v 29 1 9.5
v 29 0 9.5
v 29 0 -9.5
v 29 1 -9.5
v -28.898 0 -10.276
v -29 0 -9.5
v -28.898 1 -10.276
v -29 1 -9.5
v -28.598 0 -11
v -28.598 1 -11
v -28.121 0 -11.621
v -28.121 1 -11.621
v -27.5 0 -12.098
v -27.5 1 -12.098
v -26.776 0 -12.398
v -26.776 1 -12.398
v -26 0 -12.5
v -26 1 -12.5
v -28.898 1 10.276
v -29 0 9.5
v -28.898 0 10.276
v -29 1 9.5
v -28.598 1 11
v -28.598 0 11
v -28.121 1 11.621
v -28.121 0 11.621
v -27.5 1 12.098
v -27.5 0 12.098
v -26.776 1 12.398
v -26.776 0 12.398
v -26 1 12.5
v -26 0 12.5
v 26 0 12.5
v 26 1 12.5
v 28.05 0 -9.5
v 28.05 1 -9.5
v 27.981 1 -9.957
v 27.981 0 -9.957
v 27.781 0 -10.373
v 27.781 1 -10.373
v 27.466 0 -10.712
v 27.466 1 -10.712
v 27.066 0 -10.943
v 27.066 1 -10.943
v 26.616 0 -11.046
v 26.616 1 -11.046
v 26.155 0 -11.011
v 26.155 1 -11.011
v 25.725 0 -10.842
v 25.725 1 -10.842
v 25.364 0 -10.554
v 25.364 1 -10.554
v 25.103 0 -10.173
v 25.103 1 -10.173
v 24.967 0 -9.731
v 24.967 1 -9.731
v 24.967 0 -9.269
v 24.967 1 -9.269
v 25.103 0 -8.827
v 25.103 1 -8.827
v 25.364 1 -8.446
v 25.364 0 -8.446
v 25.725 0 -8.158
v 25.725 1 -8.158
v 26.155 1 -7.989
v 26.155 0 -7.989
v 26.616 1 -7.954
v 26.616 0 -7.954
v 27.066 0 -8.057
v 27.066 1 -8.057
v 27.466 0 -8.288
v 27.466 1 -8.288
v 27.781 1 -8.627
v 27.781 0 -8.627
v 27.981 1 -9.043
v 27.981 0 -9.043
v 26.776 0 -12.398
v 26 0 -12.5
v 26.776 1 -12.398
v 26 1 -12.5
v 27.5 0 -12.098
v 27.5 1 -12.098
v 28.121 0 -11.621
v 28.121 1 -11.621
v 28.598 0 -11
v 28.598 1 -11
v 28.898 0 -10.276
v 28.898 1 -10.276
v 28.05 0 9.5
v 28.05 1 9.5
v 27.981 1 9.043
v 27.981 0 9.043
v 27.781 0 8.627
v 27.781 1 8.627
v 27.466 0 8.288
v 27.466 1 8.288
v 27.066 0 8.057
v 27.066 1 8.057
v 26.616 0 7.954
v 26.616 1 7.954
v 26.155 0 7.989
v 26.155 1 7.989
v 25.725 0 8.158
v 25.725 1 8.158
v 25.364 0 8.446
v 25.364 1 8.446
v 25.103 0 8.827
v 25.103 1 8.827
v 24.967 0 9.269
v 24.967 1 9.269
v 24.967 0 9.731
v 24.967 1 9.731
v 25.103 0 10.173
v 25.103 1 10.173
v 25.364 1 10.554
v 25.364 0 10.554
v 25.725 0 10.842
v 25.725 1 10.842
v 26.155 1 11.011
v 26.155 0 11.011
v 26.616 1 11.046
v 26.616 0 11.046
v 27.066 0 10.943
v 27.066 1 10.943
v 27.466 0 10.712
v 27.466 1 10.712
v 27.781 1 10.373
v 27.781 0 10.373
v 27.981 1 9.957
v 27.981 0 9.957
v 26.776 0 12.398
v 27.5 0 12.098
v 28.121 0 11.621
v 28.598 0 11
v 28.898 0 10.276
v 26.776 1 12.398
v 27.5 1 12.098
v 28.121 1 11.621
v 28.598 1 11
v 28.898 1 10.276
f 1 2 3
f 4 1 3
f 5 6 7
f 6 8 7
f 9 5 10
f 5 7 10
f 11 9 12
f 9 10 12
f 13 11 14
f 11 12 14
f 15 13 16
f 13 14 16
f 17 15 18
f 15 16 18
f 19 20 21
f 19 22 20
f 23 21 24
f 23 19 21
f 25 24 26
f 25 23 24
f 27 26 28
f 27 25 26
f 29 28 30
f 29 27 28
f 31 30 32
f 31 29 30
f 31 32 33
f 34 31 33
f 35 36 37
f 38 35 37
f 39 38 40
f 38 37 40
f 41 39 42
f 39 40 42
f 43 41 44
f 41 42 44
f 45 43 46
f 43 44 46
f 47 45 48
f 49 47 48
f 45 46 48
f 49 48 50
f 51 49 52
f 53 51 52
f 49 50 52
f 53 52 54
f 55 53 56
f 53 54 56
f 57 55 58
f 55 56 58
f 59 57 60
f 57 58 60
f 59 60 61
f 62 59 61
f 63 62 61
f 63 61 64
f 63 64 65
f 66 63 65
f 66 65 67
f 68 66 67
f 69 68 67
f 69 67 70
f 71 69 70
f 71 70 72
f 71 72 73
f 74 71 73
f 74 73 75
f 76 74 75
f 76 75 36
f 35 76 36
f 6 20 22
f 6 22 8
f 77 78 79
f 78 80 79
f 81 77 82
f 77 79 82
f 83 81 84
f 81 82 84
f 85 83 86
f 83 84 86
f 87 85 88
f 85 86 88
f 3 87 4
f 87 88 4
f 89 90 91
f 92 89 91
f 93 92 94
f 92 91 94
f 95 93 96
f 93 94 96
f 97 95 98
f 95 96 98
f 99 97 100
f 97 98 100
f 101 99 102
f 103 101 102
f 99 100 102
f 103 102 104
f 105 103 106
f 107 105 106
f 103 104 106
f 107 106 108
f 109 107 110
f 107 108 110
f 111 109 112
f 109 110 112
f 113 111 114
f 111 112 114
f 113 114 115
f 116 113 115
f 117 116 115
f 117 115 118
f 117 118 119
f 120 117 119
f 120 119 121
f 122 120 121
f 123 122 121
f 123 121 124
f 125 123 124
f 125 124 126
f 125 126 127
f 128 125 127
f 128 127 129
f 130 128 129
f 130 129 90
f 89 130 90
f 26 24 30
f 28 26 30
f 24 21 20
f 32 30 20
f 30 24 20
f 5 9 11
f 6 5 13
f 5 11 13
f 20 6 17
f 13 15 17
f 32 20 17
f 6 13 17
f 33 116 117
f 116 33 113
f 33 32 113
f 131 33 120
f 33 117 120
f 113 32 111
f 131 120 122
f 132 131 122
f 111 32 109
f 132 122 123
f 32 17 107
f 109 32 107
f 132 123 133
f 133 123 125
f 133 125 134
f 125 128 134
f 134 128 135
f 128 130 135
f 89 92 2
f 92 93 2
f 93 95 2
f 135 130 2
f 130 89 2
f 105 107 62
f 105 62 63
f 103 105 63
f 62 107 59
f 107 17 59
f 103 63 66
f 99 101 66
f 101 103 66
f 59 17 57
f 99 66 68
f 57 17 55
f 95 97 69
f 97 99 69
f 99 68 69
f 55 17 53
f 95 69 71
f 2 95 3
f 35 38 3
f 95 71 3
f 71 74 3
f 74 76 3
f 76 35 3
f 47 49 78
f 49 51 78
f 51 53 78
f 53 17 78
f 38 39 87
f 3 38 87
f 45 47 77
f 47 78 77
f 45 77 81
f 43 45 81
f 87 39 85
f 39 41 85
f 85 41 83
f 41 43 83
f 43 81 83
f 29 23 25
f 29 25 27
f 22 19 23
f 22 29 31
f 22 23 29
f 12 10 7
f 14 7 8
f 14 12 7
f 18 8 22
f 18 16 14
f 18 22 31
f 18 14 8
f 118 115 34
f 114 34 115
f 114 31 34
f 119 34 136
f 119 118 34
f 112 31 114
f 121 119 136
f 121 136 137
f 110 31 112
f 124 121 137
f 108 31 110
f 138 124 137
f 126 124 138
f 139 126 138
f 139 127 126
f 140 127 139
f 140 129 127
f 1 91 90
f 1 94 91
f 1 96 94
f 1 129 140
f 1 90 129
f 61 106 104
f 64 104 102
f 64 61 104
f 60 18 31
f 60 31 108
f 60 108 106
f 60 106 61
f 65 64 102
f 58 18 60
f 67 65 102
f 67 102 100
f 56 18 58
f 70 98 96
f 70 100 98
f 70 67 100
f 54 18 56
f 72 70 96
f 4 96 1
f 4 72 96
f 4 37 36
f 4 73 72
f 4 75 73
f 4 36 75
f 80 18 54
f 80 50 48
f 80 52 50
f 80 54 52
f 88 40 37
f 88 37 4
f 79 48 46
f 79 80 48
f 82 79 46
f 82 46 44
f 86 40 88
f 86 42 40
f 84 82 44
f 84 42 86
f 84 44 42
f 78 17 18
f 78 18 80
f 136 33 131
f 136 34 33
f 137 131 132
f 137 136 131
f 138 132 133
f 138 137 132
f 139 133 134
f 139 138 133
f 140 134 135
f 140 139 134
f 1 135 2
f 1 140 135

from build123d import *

# Parameters (mm, degrees)
SKETCH_1_W          = 58
SKETCH_1_H          = 25
EXTRUDE_1_DEPTH     = 1
SKETCH_2_R          = 1.55
CUT_EXTRUDE_1_DEPTH = 2
FILLET_1_R          = 3


with BuildPart() as part:
    # 草图1 → 凸台-拉伸1 (new body)
    with BuildSketch(Plane(origin=(0, 0, 0), x_dir=(1, 0, 0), z_dir=(0, 1, 0))):
        Rectangle(SKETCH_1_W, SKETCH_1_H)
    extrude(amount=EXTRUDE_1_DEPTH)

    # 草图2 → 切除-拉伸1 (cut, through all)
    with BuildSketch(Plane(origin=(0, 1, 0), x_dir=(1, 0, 0), z_dir=(0, 1, 0))):
        with Locations((26.5, 9.5)):
            Circle(SKETCH_2_R)
        with Locations((26.5, -9.5)):
            Circle(SKETCH_2_R)
    extrude(amount=-CUT_EXTRUDE_1_DEPTH, mode=Mode.SUBTRACT)

    # 圆角1
    fillet_1_edges = [part.edges().sort_by_distance(p)[0] for p in [
        (29, 0.5, 12.5),
        (-29, 0.5, 12.5),
        (-29, 0.5, -12.5),
        (29, 0.5, -12.5),
    ]]
    fillet(fillet_1_edges, radius=FILLET_1_R)


solid = part.part
